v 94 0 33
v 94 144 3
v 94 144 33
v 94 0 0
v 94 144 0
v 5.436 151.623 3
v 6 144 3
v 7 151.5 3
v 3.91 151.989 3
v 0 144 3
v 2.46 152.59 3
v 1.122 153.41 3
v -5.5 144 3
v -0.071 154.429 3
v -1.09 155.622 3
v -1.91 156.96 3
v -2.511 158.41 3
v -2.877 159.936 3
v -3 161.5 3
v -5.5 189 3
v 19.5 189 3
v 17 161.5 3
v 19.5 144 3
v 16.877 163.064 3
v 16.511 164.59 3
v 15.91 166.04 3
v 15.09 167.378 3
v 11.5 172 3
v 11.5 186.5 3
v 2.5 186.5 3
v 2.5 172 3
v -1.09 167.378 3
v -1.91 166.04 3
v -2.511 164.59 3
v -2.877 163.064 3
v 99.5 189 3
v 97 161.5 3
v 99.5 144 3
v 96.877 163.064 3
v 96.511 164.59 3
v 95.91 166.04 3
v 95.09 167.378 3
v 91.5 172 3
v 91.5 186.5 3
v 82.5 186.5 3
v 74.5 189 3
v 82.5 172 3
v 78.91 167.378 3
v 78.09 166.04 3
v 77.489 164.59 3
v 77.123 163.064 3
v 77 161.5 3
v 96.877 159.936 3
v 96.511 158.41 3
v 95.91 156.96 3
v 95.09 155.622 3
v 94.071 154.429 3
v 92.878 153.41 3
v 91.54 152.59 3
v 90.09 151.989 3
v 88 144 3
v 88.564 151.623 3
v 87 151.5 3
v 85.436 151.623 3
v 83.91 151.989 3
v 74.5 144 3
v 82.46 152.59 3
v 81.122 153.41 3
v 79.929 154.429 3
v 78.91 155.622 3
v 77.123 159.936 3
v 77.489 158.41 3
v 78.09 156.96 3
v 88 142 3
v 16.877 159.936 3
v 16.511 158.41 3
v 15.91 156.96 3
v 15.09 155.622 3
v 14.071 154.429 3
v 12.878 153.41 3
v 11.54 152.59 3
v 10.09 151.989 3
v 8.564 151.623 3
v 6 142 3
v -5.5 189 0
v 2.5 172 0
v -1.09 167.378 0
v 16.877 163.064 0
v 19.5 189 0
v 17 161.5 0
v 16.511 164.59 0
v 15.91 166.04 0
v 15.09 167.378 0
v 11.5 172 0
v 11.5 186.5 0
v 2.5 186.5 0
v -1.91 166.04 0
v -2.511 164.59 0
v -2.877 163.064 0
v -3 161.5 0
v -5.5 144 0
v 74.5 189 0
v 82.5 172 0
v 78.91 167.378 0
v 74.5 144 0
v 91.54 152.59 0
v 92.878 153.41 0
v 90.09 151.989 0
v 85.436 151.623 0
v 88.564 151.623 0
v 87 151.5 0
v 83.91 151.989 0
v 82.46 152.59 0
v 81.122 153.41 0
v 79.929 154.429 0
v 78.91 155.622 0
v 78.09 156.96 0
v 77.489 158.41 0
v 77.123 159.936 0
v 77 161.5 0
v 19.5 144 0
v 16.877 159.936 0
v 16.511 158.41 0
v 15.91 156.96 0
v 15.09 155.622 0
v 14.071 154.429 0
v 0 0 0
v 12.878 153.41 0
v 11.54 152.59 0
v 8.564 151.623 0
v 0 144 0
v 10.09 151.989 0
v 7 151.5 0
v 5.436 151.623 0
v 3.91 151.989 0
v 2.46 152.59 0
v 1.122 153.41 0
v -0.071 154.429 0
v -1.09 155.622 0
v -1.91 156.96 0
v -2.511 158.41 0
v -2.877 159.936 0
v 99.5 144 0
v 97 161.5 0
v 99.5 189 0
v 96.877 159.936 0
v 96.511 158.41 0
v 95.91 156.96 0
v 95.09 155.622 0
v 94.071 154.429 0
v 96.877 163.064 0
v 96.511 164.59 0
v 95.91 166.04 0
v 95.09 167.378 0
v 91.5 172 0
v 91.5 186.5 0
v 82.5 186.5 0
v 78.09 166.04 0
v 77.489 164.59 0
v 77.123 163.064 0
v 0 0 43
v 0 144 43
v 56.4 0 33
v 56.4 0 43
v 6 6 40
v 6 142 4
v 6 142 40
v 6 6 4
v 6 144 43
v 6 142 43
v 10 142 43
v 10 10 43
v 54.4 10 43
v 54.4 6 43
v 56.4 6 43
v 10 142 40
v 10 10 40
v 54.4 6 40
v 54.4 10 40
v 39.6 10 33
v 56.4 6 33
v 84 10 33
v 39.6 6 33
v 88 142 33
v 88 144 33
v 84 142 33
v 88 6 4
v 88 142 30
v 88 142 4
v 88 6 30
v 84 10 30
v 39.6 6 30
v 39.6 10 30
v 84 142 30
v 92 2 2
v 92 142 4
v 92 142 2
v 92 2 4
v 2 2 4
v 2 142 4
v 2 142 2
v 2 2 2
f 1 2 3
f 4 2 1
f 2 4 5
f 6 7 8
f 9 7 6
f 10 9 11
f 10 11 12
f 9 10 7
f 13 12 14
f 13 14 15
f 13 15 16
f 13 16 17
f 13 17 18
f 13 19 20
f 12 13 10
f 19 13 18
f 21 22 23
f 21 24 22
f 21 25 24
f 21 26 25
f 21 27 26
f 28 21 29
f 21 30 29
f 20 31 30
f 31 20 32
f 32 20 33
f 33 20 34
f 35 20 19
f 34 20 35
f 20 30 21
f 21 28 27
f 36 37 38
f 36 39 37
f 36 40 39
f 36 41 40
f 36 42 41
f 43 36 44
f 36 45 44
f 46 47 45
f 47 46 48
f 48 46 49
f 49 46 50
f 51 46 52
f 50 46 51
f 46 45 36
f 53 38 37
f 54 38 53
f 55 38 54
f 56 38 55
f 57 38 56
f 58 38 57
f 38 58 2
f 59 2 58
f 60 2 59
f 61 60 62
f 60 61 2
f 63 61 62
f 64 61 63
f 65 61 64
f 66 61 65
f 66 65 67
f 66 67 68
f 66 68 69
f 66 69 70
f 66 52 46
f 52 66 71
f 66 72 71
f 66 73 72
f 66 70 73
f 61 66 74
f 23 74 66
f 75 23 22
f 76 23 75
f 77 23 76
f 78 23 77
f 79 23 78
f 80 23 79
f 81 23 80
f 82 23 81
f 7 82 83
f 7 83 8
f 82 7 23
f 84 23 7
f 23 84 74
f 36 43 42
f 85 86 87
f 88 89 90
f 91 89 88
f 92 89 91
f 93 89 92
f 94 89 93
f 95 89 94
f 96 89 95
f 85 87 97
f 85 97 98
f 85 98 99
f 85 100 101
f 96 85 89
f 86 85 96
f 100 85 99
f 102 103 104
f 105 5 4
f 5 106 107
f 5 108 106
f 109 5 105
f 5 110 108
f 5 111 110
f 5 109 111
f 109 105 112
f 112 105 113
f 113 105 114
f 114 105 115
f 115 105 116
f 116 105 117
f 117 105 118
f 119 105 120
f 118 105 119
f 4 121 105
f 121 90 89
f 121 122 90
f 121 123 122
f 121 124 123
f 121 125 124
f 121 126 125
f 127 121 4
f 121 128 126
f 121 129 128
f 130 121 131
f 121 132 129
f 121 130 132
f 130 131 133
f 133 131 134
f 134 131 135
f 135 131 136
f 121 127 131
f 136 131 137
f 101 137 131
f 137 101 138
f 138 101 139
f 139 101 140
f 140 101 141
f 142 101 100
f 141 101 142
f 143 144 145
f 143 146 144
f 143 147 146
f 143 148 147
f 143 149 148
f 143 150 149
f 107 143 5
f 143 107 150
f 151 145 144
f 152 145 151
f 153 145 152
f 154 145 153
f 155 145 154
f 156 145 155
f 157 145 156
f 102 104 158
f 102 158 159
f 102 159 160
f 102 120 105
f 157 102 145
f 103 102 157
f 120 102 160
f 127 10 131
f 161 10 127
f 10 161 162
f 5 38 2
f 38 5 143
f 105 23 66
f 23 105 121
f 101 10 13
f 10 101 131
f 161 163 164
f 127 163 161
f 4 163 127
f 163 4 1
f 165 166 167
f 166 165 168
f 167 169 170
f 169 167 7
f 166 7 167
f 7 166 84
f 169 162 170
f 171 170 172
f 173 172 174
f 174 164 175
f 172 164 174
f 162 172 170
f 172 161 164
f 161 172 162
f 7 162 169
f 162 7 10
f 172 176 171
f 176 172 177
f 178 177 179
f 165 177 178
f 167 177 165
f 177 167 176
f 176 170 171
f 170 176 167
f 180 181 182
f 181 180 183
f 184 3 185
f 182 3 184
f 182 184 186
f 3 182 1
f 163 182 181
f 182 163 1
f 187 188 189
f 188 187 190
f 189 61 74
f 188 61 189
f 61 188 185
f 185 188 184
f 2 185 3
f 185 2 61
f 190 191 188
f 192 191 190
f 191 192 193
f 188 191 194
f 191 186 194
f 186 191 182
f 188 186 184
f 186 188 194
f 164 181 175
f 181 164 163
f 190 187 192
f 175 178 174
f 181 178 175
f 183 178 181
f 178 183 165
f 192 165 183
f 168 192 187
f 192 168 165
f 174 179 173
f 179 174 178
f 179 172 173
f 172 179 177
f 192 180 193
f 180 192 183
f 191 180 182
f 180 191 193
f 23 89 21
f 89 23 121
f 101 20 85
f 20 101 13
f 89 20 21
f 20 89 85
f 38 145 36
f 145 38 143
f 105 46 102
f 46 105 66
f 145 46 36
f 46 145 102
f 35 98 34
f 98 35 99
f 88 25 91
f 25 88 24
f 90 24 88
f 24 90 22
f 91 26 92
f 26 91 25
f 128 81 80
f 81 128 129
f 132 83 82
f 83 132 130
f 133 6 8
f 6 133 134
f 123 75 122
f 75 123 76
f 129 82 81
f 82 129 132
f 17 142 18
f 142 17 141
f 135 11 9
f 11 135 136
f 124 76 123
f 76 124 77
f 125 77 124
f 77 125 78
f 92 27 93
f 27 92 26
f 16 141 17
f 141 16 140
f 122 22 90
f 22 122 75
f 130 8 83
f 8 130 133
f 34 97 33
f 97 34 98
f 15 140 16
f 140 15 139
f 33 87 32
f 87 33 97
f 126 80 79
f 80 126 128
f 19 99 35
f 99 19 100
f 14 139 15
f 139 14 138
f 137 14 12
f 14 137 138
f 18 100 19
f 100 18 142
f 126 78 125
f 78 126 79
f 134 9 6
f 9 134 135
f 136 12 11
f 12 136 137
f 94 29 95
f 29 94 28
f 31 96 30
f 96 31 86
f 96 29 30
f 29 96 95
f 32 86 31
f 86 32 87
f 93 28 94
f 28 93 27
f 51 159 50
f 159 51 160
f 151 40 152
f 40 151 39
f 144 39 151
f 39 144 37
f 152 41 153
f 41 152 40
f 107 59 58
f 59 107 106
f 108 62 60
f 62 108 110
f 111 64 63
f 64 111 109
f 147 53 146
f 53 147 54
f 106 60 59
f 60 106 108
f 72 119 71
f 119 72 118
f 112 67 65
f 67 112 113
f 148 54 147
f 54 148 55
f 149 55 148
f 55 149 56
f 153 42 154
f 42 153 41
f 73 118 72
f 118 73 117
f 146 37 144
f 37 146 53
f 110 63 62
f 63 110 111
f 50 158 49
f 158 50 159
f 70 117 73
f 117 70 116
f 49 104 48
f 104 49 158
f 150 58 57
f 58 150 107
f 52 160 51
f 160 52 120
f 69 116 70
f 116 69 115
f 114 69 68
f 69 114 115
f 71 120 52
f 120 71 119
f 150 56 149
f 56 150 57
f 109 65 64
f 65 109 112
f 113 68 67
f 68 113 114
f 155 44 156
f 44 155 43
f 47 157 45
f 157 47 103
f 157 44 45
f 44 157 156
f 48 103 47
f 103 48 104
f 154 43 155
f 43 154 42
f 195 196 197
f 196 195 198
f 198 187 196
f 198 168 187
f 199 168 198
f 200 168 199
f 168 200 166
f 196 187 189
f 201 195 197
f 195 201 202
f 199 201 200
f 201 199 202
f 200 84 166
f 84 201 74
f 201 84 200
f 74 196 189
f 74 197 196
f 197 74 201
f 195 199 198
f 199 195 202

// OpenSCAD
// Simple PSU Holder
// Bottom arm holds short part (2.5cm high, 4cm long)
// Left-right arms hold thick part (3.5cm high, 3cm long + ramp)

// PSU dimensions
psu_length = 90;        // 9cm side length
psu_width = 140;        // 14cm width  
psu_short_height = 25;  // 2.5cm high (short part)
psu_tall_height = 35;   // 3.5cm high (tall part)
psu_short_length = 40;  // 4cm long (short part)
psu_ramp_length = 10;   // 1cm long (ramp)
psu_tall_length = 30;   // 3cm long (tall part)

// Holder parameters
base_thickness = 3;
arm_thickness = 6;
bottom_arm_height = psu_short_height + 5;  // Height to grab short part (2.5cm + 0.5cm)
side_arm_height = psu_tall_height + 5;     // Height to grab tall part (3.5cm + 0.5cm) 
ledge_depth = 4;   // How far the ledges extend inward to grab PSU
ledge_thickness = 3;  // Thickness of the grabbing ledges
clearance = 2;   // Extra space around PSU

holder_length = psu_length + 2 * clearance;  // 94mm
holder_width = psu_width + 2 * clearance;    // 144mm

// Keyhole parameters
pin_head_diameter = 19;
pin_shaft_diameter = 8;
clearance_keyhole = 1;
wide_opening = pin_head_diameter + clearance_keyhole;   // 20mm
narrow_slot = pin_shaft_diameter + clearance_keyhole;   // 9mm
slot_length = 15;

// Layer thicknesses for keyhole
layer1_thickness = 3.5;  // Top layer
layer2_thickness = 3.5;  // Middle layer  
layer3_thickness = 2;    // Bottom solid layer (pin stop)

// Keyhole spacing (multiple of 4cm)
keyhole_spacing = 80;  // 2 × 4cm = 80mm
keyhole_material_width = 25;
keyhole_material_height = 45;  // Increased height to close top of keyhole

module keyhole_mount() {
    // Keyhole shape cuts through both Layer 1 and Layer 2 (no ceiling)
    translate([0, 0, -0.1]) {
        // Wide circular opening at bottom
        translate([0, -wide_opening/2 + 5, 0])
            cylinder(h = layer1_thickness + layer2_thickness + 0.2, d = wide_opening, $fn = 40);
        
        // Narrow slot extending upward
        translate([0, slot_length/2 + 5, 0])
            cube([narrow_slot, slot_length, layer1_thickness + layer2_thickness + 0.2], center = true);
        
        // Smooth transition between wide and narrow
        hull() {
            translate([0, -wide_opening/2 + 5, 0])
                cylinder(h = layer1_thickness + layer2_thickness + 0.2, d = wide_opening, $fn = 40);
            translate([0, 5, 0])
                cube([narrow_slot, 1, layer1_thickness + layer2_thickness + 0.2], center = true);
        }
    }
    
    // Layer 3: NO CUTS - solid material remains (pin stop surface)
}

module psu_holder() {
    difference() {
        union() {
            // Base plate
            translate([0, 0, 0])
            cube([holder_length, holder_width, base_thickness]);
            
            // Left arm - holds the thick part (high for 3.5cm section) 
            translate([0, 0, base_thickness])
            cube([arm_thickness, holder_width, side_arm_height]);
            
            // Left arm ledge - extends inward to grab thick part
            translate([arm_thickness, clearance, base_thickness + side_arm_height - ledge_thickness])
            cube([ledge_depth, holder_width - 2 * clearance, ledge_thickness]);
            
            // Right arm - holds the thin part (short for 2.5cm section)
            translate([holder_length - arm_thickness, 0, base_thickness])
            cube([arm_thickness, holder_width, bottom_arm_height]);
            
            // Right arm ledge - extends inward to grab thin part  
            translate([holder_length - arm_thickness - ledge_depth, clearance, base_thickness + bottom_arm_height - ledge_thickness])
            cube([ledge_depth, holder_width - 2 * clearance, ledge_thickness]);
            
            // Bottom left arm (left-leaning, high for thick section)
            bottom_left_width = holder_length * 0.6; // 60% of length for thick section
            translate([0, 0, base_thickness])
            cube([bottom_left_width, arm_thickness, side_arm_height]);
            
            // Bottom left arm ledge
            translate([clearance, arm_thickness, base_thickness + side_arm_height - ledge_thickness])
            cube([bottom_left_width - 2 * clearance, ledge_depth, ledge_thickness]);
            
            // Bottom right arm (right-leaning, short for thin section)  
            bottom_right_start = holder_length * 0.4; // Start at 40% for thin section
            bottom_right_width = holder_length - bottom_right_start;
            translate([bottom_right_start, 0, base_thickness])
            cube([bottom_right_width, arm_thickness, bottom_arm_height]);
            
            // Bottom right arm ledge
            translate([bottom_right_start + clearance, arm_thickness, base_thickness + bottom_arm_height - ledge_thickness])
            cube([bottom_right_width - 2 * clearance, ledge_depth, ledge_thickness]);
            
            // Keyhole mounting material (positioned in top area where there are no arms)
            case_center_x = holder_length / 2;
            keyhole_y_pos = holder_width; // At the top end (opposite from bottom arms)
            keyhole_1_x = case_center_x - keyhole_spacing / 2;  // 40mm left of center
            keyhole_2_x = case_center_x + keyhole_spacing / 2;  // 40mm right of center
            
            // First keyhole tab
            translate([keyhole_1_x - keyhole_material_width/2, keyhole_y_pos, 0])
            cube([keyhole_material_width, keyhole_material_height, base_thickness]);
            
            // Second keyhole tab  
            translate([keyhole_2_x - keyhole_material_width/2, keyhole_y_pos, 0])
            cube([keyhole_material_width, keyhole_material_height, base_thickness]);
        }
        
        // PSU cavity (sunken area for PSU to sit in)
        translate([clearance, clearance, base_thickness - 1])
        cube([psu_length, psu_width, 2]); // 1mm sunken depth
        
        // Keyhole mounting holes (in top area)
        case_center_x = holder_length / 2;
        keyhole_y_center = holder_width + keyhole_material_height / 2; // Center of keyhole tabs
        keyhole_1_x = case_center_x - keyhole_spacing / 2;
        keyhole_2_x = case_center_x + keyhole_spacing / 2;
        
        for (keyhole_x = [keyhole_1_x, keyhole_2_x]) {
            translate([keyhole_x, keyhole_y_center, 0]) {
                keyhole_mount();
            }
        }
    }
}

// Show PSU holder
psu_holder();
